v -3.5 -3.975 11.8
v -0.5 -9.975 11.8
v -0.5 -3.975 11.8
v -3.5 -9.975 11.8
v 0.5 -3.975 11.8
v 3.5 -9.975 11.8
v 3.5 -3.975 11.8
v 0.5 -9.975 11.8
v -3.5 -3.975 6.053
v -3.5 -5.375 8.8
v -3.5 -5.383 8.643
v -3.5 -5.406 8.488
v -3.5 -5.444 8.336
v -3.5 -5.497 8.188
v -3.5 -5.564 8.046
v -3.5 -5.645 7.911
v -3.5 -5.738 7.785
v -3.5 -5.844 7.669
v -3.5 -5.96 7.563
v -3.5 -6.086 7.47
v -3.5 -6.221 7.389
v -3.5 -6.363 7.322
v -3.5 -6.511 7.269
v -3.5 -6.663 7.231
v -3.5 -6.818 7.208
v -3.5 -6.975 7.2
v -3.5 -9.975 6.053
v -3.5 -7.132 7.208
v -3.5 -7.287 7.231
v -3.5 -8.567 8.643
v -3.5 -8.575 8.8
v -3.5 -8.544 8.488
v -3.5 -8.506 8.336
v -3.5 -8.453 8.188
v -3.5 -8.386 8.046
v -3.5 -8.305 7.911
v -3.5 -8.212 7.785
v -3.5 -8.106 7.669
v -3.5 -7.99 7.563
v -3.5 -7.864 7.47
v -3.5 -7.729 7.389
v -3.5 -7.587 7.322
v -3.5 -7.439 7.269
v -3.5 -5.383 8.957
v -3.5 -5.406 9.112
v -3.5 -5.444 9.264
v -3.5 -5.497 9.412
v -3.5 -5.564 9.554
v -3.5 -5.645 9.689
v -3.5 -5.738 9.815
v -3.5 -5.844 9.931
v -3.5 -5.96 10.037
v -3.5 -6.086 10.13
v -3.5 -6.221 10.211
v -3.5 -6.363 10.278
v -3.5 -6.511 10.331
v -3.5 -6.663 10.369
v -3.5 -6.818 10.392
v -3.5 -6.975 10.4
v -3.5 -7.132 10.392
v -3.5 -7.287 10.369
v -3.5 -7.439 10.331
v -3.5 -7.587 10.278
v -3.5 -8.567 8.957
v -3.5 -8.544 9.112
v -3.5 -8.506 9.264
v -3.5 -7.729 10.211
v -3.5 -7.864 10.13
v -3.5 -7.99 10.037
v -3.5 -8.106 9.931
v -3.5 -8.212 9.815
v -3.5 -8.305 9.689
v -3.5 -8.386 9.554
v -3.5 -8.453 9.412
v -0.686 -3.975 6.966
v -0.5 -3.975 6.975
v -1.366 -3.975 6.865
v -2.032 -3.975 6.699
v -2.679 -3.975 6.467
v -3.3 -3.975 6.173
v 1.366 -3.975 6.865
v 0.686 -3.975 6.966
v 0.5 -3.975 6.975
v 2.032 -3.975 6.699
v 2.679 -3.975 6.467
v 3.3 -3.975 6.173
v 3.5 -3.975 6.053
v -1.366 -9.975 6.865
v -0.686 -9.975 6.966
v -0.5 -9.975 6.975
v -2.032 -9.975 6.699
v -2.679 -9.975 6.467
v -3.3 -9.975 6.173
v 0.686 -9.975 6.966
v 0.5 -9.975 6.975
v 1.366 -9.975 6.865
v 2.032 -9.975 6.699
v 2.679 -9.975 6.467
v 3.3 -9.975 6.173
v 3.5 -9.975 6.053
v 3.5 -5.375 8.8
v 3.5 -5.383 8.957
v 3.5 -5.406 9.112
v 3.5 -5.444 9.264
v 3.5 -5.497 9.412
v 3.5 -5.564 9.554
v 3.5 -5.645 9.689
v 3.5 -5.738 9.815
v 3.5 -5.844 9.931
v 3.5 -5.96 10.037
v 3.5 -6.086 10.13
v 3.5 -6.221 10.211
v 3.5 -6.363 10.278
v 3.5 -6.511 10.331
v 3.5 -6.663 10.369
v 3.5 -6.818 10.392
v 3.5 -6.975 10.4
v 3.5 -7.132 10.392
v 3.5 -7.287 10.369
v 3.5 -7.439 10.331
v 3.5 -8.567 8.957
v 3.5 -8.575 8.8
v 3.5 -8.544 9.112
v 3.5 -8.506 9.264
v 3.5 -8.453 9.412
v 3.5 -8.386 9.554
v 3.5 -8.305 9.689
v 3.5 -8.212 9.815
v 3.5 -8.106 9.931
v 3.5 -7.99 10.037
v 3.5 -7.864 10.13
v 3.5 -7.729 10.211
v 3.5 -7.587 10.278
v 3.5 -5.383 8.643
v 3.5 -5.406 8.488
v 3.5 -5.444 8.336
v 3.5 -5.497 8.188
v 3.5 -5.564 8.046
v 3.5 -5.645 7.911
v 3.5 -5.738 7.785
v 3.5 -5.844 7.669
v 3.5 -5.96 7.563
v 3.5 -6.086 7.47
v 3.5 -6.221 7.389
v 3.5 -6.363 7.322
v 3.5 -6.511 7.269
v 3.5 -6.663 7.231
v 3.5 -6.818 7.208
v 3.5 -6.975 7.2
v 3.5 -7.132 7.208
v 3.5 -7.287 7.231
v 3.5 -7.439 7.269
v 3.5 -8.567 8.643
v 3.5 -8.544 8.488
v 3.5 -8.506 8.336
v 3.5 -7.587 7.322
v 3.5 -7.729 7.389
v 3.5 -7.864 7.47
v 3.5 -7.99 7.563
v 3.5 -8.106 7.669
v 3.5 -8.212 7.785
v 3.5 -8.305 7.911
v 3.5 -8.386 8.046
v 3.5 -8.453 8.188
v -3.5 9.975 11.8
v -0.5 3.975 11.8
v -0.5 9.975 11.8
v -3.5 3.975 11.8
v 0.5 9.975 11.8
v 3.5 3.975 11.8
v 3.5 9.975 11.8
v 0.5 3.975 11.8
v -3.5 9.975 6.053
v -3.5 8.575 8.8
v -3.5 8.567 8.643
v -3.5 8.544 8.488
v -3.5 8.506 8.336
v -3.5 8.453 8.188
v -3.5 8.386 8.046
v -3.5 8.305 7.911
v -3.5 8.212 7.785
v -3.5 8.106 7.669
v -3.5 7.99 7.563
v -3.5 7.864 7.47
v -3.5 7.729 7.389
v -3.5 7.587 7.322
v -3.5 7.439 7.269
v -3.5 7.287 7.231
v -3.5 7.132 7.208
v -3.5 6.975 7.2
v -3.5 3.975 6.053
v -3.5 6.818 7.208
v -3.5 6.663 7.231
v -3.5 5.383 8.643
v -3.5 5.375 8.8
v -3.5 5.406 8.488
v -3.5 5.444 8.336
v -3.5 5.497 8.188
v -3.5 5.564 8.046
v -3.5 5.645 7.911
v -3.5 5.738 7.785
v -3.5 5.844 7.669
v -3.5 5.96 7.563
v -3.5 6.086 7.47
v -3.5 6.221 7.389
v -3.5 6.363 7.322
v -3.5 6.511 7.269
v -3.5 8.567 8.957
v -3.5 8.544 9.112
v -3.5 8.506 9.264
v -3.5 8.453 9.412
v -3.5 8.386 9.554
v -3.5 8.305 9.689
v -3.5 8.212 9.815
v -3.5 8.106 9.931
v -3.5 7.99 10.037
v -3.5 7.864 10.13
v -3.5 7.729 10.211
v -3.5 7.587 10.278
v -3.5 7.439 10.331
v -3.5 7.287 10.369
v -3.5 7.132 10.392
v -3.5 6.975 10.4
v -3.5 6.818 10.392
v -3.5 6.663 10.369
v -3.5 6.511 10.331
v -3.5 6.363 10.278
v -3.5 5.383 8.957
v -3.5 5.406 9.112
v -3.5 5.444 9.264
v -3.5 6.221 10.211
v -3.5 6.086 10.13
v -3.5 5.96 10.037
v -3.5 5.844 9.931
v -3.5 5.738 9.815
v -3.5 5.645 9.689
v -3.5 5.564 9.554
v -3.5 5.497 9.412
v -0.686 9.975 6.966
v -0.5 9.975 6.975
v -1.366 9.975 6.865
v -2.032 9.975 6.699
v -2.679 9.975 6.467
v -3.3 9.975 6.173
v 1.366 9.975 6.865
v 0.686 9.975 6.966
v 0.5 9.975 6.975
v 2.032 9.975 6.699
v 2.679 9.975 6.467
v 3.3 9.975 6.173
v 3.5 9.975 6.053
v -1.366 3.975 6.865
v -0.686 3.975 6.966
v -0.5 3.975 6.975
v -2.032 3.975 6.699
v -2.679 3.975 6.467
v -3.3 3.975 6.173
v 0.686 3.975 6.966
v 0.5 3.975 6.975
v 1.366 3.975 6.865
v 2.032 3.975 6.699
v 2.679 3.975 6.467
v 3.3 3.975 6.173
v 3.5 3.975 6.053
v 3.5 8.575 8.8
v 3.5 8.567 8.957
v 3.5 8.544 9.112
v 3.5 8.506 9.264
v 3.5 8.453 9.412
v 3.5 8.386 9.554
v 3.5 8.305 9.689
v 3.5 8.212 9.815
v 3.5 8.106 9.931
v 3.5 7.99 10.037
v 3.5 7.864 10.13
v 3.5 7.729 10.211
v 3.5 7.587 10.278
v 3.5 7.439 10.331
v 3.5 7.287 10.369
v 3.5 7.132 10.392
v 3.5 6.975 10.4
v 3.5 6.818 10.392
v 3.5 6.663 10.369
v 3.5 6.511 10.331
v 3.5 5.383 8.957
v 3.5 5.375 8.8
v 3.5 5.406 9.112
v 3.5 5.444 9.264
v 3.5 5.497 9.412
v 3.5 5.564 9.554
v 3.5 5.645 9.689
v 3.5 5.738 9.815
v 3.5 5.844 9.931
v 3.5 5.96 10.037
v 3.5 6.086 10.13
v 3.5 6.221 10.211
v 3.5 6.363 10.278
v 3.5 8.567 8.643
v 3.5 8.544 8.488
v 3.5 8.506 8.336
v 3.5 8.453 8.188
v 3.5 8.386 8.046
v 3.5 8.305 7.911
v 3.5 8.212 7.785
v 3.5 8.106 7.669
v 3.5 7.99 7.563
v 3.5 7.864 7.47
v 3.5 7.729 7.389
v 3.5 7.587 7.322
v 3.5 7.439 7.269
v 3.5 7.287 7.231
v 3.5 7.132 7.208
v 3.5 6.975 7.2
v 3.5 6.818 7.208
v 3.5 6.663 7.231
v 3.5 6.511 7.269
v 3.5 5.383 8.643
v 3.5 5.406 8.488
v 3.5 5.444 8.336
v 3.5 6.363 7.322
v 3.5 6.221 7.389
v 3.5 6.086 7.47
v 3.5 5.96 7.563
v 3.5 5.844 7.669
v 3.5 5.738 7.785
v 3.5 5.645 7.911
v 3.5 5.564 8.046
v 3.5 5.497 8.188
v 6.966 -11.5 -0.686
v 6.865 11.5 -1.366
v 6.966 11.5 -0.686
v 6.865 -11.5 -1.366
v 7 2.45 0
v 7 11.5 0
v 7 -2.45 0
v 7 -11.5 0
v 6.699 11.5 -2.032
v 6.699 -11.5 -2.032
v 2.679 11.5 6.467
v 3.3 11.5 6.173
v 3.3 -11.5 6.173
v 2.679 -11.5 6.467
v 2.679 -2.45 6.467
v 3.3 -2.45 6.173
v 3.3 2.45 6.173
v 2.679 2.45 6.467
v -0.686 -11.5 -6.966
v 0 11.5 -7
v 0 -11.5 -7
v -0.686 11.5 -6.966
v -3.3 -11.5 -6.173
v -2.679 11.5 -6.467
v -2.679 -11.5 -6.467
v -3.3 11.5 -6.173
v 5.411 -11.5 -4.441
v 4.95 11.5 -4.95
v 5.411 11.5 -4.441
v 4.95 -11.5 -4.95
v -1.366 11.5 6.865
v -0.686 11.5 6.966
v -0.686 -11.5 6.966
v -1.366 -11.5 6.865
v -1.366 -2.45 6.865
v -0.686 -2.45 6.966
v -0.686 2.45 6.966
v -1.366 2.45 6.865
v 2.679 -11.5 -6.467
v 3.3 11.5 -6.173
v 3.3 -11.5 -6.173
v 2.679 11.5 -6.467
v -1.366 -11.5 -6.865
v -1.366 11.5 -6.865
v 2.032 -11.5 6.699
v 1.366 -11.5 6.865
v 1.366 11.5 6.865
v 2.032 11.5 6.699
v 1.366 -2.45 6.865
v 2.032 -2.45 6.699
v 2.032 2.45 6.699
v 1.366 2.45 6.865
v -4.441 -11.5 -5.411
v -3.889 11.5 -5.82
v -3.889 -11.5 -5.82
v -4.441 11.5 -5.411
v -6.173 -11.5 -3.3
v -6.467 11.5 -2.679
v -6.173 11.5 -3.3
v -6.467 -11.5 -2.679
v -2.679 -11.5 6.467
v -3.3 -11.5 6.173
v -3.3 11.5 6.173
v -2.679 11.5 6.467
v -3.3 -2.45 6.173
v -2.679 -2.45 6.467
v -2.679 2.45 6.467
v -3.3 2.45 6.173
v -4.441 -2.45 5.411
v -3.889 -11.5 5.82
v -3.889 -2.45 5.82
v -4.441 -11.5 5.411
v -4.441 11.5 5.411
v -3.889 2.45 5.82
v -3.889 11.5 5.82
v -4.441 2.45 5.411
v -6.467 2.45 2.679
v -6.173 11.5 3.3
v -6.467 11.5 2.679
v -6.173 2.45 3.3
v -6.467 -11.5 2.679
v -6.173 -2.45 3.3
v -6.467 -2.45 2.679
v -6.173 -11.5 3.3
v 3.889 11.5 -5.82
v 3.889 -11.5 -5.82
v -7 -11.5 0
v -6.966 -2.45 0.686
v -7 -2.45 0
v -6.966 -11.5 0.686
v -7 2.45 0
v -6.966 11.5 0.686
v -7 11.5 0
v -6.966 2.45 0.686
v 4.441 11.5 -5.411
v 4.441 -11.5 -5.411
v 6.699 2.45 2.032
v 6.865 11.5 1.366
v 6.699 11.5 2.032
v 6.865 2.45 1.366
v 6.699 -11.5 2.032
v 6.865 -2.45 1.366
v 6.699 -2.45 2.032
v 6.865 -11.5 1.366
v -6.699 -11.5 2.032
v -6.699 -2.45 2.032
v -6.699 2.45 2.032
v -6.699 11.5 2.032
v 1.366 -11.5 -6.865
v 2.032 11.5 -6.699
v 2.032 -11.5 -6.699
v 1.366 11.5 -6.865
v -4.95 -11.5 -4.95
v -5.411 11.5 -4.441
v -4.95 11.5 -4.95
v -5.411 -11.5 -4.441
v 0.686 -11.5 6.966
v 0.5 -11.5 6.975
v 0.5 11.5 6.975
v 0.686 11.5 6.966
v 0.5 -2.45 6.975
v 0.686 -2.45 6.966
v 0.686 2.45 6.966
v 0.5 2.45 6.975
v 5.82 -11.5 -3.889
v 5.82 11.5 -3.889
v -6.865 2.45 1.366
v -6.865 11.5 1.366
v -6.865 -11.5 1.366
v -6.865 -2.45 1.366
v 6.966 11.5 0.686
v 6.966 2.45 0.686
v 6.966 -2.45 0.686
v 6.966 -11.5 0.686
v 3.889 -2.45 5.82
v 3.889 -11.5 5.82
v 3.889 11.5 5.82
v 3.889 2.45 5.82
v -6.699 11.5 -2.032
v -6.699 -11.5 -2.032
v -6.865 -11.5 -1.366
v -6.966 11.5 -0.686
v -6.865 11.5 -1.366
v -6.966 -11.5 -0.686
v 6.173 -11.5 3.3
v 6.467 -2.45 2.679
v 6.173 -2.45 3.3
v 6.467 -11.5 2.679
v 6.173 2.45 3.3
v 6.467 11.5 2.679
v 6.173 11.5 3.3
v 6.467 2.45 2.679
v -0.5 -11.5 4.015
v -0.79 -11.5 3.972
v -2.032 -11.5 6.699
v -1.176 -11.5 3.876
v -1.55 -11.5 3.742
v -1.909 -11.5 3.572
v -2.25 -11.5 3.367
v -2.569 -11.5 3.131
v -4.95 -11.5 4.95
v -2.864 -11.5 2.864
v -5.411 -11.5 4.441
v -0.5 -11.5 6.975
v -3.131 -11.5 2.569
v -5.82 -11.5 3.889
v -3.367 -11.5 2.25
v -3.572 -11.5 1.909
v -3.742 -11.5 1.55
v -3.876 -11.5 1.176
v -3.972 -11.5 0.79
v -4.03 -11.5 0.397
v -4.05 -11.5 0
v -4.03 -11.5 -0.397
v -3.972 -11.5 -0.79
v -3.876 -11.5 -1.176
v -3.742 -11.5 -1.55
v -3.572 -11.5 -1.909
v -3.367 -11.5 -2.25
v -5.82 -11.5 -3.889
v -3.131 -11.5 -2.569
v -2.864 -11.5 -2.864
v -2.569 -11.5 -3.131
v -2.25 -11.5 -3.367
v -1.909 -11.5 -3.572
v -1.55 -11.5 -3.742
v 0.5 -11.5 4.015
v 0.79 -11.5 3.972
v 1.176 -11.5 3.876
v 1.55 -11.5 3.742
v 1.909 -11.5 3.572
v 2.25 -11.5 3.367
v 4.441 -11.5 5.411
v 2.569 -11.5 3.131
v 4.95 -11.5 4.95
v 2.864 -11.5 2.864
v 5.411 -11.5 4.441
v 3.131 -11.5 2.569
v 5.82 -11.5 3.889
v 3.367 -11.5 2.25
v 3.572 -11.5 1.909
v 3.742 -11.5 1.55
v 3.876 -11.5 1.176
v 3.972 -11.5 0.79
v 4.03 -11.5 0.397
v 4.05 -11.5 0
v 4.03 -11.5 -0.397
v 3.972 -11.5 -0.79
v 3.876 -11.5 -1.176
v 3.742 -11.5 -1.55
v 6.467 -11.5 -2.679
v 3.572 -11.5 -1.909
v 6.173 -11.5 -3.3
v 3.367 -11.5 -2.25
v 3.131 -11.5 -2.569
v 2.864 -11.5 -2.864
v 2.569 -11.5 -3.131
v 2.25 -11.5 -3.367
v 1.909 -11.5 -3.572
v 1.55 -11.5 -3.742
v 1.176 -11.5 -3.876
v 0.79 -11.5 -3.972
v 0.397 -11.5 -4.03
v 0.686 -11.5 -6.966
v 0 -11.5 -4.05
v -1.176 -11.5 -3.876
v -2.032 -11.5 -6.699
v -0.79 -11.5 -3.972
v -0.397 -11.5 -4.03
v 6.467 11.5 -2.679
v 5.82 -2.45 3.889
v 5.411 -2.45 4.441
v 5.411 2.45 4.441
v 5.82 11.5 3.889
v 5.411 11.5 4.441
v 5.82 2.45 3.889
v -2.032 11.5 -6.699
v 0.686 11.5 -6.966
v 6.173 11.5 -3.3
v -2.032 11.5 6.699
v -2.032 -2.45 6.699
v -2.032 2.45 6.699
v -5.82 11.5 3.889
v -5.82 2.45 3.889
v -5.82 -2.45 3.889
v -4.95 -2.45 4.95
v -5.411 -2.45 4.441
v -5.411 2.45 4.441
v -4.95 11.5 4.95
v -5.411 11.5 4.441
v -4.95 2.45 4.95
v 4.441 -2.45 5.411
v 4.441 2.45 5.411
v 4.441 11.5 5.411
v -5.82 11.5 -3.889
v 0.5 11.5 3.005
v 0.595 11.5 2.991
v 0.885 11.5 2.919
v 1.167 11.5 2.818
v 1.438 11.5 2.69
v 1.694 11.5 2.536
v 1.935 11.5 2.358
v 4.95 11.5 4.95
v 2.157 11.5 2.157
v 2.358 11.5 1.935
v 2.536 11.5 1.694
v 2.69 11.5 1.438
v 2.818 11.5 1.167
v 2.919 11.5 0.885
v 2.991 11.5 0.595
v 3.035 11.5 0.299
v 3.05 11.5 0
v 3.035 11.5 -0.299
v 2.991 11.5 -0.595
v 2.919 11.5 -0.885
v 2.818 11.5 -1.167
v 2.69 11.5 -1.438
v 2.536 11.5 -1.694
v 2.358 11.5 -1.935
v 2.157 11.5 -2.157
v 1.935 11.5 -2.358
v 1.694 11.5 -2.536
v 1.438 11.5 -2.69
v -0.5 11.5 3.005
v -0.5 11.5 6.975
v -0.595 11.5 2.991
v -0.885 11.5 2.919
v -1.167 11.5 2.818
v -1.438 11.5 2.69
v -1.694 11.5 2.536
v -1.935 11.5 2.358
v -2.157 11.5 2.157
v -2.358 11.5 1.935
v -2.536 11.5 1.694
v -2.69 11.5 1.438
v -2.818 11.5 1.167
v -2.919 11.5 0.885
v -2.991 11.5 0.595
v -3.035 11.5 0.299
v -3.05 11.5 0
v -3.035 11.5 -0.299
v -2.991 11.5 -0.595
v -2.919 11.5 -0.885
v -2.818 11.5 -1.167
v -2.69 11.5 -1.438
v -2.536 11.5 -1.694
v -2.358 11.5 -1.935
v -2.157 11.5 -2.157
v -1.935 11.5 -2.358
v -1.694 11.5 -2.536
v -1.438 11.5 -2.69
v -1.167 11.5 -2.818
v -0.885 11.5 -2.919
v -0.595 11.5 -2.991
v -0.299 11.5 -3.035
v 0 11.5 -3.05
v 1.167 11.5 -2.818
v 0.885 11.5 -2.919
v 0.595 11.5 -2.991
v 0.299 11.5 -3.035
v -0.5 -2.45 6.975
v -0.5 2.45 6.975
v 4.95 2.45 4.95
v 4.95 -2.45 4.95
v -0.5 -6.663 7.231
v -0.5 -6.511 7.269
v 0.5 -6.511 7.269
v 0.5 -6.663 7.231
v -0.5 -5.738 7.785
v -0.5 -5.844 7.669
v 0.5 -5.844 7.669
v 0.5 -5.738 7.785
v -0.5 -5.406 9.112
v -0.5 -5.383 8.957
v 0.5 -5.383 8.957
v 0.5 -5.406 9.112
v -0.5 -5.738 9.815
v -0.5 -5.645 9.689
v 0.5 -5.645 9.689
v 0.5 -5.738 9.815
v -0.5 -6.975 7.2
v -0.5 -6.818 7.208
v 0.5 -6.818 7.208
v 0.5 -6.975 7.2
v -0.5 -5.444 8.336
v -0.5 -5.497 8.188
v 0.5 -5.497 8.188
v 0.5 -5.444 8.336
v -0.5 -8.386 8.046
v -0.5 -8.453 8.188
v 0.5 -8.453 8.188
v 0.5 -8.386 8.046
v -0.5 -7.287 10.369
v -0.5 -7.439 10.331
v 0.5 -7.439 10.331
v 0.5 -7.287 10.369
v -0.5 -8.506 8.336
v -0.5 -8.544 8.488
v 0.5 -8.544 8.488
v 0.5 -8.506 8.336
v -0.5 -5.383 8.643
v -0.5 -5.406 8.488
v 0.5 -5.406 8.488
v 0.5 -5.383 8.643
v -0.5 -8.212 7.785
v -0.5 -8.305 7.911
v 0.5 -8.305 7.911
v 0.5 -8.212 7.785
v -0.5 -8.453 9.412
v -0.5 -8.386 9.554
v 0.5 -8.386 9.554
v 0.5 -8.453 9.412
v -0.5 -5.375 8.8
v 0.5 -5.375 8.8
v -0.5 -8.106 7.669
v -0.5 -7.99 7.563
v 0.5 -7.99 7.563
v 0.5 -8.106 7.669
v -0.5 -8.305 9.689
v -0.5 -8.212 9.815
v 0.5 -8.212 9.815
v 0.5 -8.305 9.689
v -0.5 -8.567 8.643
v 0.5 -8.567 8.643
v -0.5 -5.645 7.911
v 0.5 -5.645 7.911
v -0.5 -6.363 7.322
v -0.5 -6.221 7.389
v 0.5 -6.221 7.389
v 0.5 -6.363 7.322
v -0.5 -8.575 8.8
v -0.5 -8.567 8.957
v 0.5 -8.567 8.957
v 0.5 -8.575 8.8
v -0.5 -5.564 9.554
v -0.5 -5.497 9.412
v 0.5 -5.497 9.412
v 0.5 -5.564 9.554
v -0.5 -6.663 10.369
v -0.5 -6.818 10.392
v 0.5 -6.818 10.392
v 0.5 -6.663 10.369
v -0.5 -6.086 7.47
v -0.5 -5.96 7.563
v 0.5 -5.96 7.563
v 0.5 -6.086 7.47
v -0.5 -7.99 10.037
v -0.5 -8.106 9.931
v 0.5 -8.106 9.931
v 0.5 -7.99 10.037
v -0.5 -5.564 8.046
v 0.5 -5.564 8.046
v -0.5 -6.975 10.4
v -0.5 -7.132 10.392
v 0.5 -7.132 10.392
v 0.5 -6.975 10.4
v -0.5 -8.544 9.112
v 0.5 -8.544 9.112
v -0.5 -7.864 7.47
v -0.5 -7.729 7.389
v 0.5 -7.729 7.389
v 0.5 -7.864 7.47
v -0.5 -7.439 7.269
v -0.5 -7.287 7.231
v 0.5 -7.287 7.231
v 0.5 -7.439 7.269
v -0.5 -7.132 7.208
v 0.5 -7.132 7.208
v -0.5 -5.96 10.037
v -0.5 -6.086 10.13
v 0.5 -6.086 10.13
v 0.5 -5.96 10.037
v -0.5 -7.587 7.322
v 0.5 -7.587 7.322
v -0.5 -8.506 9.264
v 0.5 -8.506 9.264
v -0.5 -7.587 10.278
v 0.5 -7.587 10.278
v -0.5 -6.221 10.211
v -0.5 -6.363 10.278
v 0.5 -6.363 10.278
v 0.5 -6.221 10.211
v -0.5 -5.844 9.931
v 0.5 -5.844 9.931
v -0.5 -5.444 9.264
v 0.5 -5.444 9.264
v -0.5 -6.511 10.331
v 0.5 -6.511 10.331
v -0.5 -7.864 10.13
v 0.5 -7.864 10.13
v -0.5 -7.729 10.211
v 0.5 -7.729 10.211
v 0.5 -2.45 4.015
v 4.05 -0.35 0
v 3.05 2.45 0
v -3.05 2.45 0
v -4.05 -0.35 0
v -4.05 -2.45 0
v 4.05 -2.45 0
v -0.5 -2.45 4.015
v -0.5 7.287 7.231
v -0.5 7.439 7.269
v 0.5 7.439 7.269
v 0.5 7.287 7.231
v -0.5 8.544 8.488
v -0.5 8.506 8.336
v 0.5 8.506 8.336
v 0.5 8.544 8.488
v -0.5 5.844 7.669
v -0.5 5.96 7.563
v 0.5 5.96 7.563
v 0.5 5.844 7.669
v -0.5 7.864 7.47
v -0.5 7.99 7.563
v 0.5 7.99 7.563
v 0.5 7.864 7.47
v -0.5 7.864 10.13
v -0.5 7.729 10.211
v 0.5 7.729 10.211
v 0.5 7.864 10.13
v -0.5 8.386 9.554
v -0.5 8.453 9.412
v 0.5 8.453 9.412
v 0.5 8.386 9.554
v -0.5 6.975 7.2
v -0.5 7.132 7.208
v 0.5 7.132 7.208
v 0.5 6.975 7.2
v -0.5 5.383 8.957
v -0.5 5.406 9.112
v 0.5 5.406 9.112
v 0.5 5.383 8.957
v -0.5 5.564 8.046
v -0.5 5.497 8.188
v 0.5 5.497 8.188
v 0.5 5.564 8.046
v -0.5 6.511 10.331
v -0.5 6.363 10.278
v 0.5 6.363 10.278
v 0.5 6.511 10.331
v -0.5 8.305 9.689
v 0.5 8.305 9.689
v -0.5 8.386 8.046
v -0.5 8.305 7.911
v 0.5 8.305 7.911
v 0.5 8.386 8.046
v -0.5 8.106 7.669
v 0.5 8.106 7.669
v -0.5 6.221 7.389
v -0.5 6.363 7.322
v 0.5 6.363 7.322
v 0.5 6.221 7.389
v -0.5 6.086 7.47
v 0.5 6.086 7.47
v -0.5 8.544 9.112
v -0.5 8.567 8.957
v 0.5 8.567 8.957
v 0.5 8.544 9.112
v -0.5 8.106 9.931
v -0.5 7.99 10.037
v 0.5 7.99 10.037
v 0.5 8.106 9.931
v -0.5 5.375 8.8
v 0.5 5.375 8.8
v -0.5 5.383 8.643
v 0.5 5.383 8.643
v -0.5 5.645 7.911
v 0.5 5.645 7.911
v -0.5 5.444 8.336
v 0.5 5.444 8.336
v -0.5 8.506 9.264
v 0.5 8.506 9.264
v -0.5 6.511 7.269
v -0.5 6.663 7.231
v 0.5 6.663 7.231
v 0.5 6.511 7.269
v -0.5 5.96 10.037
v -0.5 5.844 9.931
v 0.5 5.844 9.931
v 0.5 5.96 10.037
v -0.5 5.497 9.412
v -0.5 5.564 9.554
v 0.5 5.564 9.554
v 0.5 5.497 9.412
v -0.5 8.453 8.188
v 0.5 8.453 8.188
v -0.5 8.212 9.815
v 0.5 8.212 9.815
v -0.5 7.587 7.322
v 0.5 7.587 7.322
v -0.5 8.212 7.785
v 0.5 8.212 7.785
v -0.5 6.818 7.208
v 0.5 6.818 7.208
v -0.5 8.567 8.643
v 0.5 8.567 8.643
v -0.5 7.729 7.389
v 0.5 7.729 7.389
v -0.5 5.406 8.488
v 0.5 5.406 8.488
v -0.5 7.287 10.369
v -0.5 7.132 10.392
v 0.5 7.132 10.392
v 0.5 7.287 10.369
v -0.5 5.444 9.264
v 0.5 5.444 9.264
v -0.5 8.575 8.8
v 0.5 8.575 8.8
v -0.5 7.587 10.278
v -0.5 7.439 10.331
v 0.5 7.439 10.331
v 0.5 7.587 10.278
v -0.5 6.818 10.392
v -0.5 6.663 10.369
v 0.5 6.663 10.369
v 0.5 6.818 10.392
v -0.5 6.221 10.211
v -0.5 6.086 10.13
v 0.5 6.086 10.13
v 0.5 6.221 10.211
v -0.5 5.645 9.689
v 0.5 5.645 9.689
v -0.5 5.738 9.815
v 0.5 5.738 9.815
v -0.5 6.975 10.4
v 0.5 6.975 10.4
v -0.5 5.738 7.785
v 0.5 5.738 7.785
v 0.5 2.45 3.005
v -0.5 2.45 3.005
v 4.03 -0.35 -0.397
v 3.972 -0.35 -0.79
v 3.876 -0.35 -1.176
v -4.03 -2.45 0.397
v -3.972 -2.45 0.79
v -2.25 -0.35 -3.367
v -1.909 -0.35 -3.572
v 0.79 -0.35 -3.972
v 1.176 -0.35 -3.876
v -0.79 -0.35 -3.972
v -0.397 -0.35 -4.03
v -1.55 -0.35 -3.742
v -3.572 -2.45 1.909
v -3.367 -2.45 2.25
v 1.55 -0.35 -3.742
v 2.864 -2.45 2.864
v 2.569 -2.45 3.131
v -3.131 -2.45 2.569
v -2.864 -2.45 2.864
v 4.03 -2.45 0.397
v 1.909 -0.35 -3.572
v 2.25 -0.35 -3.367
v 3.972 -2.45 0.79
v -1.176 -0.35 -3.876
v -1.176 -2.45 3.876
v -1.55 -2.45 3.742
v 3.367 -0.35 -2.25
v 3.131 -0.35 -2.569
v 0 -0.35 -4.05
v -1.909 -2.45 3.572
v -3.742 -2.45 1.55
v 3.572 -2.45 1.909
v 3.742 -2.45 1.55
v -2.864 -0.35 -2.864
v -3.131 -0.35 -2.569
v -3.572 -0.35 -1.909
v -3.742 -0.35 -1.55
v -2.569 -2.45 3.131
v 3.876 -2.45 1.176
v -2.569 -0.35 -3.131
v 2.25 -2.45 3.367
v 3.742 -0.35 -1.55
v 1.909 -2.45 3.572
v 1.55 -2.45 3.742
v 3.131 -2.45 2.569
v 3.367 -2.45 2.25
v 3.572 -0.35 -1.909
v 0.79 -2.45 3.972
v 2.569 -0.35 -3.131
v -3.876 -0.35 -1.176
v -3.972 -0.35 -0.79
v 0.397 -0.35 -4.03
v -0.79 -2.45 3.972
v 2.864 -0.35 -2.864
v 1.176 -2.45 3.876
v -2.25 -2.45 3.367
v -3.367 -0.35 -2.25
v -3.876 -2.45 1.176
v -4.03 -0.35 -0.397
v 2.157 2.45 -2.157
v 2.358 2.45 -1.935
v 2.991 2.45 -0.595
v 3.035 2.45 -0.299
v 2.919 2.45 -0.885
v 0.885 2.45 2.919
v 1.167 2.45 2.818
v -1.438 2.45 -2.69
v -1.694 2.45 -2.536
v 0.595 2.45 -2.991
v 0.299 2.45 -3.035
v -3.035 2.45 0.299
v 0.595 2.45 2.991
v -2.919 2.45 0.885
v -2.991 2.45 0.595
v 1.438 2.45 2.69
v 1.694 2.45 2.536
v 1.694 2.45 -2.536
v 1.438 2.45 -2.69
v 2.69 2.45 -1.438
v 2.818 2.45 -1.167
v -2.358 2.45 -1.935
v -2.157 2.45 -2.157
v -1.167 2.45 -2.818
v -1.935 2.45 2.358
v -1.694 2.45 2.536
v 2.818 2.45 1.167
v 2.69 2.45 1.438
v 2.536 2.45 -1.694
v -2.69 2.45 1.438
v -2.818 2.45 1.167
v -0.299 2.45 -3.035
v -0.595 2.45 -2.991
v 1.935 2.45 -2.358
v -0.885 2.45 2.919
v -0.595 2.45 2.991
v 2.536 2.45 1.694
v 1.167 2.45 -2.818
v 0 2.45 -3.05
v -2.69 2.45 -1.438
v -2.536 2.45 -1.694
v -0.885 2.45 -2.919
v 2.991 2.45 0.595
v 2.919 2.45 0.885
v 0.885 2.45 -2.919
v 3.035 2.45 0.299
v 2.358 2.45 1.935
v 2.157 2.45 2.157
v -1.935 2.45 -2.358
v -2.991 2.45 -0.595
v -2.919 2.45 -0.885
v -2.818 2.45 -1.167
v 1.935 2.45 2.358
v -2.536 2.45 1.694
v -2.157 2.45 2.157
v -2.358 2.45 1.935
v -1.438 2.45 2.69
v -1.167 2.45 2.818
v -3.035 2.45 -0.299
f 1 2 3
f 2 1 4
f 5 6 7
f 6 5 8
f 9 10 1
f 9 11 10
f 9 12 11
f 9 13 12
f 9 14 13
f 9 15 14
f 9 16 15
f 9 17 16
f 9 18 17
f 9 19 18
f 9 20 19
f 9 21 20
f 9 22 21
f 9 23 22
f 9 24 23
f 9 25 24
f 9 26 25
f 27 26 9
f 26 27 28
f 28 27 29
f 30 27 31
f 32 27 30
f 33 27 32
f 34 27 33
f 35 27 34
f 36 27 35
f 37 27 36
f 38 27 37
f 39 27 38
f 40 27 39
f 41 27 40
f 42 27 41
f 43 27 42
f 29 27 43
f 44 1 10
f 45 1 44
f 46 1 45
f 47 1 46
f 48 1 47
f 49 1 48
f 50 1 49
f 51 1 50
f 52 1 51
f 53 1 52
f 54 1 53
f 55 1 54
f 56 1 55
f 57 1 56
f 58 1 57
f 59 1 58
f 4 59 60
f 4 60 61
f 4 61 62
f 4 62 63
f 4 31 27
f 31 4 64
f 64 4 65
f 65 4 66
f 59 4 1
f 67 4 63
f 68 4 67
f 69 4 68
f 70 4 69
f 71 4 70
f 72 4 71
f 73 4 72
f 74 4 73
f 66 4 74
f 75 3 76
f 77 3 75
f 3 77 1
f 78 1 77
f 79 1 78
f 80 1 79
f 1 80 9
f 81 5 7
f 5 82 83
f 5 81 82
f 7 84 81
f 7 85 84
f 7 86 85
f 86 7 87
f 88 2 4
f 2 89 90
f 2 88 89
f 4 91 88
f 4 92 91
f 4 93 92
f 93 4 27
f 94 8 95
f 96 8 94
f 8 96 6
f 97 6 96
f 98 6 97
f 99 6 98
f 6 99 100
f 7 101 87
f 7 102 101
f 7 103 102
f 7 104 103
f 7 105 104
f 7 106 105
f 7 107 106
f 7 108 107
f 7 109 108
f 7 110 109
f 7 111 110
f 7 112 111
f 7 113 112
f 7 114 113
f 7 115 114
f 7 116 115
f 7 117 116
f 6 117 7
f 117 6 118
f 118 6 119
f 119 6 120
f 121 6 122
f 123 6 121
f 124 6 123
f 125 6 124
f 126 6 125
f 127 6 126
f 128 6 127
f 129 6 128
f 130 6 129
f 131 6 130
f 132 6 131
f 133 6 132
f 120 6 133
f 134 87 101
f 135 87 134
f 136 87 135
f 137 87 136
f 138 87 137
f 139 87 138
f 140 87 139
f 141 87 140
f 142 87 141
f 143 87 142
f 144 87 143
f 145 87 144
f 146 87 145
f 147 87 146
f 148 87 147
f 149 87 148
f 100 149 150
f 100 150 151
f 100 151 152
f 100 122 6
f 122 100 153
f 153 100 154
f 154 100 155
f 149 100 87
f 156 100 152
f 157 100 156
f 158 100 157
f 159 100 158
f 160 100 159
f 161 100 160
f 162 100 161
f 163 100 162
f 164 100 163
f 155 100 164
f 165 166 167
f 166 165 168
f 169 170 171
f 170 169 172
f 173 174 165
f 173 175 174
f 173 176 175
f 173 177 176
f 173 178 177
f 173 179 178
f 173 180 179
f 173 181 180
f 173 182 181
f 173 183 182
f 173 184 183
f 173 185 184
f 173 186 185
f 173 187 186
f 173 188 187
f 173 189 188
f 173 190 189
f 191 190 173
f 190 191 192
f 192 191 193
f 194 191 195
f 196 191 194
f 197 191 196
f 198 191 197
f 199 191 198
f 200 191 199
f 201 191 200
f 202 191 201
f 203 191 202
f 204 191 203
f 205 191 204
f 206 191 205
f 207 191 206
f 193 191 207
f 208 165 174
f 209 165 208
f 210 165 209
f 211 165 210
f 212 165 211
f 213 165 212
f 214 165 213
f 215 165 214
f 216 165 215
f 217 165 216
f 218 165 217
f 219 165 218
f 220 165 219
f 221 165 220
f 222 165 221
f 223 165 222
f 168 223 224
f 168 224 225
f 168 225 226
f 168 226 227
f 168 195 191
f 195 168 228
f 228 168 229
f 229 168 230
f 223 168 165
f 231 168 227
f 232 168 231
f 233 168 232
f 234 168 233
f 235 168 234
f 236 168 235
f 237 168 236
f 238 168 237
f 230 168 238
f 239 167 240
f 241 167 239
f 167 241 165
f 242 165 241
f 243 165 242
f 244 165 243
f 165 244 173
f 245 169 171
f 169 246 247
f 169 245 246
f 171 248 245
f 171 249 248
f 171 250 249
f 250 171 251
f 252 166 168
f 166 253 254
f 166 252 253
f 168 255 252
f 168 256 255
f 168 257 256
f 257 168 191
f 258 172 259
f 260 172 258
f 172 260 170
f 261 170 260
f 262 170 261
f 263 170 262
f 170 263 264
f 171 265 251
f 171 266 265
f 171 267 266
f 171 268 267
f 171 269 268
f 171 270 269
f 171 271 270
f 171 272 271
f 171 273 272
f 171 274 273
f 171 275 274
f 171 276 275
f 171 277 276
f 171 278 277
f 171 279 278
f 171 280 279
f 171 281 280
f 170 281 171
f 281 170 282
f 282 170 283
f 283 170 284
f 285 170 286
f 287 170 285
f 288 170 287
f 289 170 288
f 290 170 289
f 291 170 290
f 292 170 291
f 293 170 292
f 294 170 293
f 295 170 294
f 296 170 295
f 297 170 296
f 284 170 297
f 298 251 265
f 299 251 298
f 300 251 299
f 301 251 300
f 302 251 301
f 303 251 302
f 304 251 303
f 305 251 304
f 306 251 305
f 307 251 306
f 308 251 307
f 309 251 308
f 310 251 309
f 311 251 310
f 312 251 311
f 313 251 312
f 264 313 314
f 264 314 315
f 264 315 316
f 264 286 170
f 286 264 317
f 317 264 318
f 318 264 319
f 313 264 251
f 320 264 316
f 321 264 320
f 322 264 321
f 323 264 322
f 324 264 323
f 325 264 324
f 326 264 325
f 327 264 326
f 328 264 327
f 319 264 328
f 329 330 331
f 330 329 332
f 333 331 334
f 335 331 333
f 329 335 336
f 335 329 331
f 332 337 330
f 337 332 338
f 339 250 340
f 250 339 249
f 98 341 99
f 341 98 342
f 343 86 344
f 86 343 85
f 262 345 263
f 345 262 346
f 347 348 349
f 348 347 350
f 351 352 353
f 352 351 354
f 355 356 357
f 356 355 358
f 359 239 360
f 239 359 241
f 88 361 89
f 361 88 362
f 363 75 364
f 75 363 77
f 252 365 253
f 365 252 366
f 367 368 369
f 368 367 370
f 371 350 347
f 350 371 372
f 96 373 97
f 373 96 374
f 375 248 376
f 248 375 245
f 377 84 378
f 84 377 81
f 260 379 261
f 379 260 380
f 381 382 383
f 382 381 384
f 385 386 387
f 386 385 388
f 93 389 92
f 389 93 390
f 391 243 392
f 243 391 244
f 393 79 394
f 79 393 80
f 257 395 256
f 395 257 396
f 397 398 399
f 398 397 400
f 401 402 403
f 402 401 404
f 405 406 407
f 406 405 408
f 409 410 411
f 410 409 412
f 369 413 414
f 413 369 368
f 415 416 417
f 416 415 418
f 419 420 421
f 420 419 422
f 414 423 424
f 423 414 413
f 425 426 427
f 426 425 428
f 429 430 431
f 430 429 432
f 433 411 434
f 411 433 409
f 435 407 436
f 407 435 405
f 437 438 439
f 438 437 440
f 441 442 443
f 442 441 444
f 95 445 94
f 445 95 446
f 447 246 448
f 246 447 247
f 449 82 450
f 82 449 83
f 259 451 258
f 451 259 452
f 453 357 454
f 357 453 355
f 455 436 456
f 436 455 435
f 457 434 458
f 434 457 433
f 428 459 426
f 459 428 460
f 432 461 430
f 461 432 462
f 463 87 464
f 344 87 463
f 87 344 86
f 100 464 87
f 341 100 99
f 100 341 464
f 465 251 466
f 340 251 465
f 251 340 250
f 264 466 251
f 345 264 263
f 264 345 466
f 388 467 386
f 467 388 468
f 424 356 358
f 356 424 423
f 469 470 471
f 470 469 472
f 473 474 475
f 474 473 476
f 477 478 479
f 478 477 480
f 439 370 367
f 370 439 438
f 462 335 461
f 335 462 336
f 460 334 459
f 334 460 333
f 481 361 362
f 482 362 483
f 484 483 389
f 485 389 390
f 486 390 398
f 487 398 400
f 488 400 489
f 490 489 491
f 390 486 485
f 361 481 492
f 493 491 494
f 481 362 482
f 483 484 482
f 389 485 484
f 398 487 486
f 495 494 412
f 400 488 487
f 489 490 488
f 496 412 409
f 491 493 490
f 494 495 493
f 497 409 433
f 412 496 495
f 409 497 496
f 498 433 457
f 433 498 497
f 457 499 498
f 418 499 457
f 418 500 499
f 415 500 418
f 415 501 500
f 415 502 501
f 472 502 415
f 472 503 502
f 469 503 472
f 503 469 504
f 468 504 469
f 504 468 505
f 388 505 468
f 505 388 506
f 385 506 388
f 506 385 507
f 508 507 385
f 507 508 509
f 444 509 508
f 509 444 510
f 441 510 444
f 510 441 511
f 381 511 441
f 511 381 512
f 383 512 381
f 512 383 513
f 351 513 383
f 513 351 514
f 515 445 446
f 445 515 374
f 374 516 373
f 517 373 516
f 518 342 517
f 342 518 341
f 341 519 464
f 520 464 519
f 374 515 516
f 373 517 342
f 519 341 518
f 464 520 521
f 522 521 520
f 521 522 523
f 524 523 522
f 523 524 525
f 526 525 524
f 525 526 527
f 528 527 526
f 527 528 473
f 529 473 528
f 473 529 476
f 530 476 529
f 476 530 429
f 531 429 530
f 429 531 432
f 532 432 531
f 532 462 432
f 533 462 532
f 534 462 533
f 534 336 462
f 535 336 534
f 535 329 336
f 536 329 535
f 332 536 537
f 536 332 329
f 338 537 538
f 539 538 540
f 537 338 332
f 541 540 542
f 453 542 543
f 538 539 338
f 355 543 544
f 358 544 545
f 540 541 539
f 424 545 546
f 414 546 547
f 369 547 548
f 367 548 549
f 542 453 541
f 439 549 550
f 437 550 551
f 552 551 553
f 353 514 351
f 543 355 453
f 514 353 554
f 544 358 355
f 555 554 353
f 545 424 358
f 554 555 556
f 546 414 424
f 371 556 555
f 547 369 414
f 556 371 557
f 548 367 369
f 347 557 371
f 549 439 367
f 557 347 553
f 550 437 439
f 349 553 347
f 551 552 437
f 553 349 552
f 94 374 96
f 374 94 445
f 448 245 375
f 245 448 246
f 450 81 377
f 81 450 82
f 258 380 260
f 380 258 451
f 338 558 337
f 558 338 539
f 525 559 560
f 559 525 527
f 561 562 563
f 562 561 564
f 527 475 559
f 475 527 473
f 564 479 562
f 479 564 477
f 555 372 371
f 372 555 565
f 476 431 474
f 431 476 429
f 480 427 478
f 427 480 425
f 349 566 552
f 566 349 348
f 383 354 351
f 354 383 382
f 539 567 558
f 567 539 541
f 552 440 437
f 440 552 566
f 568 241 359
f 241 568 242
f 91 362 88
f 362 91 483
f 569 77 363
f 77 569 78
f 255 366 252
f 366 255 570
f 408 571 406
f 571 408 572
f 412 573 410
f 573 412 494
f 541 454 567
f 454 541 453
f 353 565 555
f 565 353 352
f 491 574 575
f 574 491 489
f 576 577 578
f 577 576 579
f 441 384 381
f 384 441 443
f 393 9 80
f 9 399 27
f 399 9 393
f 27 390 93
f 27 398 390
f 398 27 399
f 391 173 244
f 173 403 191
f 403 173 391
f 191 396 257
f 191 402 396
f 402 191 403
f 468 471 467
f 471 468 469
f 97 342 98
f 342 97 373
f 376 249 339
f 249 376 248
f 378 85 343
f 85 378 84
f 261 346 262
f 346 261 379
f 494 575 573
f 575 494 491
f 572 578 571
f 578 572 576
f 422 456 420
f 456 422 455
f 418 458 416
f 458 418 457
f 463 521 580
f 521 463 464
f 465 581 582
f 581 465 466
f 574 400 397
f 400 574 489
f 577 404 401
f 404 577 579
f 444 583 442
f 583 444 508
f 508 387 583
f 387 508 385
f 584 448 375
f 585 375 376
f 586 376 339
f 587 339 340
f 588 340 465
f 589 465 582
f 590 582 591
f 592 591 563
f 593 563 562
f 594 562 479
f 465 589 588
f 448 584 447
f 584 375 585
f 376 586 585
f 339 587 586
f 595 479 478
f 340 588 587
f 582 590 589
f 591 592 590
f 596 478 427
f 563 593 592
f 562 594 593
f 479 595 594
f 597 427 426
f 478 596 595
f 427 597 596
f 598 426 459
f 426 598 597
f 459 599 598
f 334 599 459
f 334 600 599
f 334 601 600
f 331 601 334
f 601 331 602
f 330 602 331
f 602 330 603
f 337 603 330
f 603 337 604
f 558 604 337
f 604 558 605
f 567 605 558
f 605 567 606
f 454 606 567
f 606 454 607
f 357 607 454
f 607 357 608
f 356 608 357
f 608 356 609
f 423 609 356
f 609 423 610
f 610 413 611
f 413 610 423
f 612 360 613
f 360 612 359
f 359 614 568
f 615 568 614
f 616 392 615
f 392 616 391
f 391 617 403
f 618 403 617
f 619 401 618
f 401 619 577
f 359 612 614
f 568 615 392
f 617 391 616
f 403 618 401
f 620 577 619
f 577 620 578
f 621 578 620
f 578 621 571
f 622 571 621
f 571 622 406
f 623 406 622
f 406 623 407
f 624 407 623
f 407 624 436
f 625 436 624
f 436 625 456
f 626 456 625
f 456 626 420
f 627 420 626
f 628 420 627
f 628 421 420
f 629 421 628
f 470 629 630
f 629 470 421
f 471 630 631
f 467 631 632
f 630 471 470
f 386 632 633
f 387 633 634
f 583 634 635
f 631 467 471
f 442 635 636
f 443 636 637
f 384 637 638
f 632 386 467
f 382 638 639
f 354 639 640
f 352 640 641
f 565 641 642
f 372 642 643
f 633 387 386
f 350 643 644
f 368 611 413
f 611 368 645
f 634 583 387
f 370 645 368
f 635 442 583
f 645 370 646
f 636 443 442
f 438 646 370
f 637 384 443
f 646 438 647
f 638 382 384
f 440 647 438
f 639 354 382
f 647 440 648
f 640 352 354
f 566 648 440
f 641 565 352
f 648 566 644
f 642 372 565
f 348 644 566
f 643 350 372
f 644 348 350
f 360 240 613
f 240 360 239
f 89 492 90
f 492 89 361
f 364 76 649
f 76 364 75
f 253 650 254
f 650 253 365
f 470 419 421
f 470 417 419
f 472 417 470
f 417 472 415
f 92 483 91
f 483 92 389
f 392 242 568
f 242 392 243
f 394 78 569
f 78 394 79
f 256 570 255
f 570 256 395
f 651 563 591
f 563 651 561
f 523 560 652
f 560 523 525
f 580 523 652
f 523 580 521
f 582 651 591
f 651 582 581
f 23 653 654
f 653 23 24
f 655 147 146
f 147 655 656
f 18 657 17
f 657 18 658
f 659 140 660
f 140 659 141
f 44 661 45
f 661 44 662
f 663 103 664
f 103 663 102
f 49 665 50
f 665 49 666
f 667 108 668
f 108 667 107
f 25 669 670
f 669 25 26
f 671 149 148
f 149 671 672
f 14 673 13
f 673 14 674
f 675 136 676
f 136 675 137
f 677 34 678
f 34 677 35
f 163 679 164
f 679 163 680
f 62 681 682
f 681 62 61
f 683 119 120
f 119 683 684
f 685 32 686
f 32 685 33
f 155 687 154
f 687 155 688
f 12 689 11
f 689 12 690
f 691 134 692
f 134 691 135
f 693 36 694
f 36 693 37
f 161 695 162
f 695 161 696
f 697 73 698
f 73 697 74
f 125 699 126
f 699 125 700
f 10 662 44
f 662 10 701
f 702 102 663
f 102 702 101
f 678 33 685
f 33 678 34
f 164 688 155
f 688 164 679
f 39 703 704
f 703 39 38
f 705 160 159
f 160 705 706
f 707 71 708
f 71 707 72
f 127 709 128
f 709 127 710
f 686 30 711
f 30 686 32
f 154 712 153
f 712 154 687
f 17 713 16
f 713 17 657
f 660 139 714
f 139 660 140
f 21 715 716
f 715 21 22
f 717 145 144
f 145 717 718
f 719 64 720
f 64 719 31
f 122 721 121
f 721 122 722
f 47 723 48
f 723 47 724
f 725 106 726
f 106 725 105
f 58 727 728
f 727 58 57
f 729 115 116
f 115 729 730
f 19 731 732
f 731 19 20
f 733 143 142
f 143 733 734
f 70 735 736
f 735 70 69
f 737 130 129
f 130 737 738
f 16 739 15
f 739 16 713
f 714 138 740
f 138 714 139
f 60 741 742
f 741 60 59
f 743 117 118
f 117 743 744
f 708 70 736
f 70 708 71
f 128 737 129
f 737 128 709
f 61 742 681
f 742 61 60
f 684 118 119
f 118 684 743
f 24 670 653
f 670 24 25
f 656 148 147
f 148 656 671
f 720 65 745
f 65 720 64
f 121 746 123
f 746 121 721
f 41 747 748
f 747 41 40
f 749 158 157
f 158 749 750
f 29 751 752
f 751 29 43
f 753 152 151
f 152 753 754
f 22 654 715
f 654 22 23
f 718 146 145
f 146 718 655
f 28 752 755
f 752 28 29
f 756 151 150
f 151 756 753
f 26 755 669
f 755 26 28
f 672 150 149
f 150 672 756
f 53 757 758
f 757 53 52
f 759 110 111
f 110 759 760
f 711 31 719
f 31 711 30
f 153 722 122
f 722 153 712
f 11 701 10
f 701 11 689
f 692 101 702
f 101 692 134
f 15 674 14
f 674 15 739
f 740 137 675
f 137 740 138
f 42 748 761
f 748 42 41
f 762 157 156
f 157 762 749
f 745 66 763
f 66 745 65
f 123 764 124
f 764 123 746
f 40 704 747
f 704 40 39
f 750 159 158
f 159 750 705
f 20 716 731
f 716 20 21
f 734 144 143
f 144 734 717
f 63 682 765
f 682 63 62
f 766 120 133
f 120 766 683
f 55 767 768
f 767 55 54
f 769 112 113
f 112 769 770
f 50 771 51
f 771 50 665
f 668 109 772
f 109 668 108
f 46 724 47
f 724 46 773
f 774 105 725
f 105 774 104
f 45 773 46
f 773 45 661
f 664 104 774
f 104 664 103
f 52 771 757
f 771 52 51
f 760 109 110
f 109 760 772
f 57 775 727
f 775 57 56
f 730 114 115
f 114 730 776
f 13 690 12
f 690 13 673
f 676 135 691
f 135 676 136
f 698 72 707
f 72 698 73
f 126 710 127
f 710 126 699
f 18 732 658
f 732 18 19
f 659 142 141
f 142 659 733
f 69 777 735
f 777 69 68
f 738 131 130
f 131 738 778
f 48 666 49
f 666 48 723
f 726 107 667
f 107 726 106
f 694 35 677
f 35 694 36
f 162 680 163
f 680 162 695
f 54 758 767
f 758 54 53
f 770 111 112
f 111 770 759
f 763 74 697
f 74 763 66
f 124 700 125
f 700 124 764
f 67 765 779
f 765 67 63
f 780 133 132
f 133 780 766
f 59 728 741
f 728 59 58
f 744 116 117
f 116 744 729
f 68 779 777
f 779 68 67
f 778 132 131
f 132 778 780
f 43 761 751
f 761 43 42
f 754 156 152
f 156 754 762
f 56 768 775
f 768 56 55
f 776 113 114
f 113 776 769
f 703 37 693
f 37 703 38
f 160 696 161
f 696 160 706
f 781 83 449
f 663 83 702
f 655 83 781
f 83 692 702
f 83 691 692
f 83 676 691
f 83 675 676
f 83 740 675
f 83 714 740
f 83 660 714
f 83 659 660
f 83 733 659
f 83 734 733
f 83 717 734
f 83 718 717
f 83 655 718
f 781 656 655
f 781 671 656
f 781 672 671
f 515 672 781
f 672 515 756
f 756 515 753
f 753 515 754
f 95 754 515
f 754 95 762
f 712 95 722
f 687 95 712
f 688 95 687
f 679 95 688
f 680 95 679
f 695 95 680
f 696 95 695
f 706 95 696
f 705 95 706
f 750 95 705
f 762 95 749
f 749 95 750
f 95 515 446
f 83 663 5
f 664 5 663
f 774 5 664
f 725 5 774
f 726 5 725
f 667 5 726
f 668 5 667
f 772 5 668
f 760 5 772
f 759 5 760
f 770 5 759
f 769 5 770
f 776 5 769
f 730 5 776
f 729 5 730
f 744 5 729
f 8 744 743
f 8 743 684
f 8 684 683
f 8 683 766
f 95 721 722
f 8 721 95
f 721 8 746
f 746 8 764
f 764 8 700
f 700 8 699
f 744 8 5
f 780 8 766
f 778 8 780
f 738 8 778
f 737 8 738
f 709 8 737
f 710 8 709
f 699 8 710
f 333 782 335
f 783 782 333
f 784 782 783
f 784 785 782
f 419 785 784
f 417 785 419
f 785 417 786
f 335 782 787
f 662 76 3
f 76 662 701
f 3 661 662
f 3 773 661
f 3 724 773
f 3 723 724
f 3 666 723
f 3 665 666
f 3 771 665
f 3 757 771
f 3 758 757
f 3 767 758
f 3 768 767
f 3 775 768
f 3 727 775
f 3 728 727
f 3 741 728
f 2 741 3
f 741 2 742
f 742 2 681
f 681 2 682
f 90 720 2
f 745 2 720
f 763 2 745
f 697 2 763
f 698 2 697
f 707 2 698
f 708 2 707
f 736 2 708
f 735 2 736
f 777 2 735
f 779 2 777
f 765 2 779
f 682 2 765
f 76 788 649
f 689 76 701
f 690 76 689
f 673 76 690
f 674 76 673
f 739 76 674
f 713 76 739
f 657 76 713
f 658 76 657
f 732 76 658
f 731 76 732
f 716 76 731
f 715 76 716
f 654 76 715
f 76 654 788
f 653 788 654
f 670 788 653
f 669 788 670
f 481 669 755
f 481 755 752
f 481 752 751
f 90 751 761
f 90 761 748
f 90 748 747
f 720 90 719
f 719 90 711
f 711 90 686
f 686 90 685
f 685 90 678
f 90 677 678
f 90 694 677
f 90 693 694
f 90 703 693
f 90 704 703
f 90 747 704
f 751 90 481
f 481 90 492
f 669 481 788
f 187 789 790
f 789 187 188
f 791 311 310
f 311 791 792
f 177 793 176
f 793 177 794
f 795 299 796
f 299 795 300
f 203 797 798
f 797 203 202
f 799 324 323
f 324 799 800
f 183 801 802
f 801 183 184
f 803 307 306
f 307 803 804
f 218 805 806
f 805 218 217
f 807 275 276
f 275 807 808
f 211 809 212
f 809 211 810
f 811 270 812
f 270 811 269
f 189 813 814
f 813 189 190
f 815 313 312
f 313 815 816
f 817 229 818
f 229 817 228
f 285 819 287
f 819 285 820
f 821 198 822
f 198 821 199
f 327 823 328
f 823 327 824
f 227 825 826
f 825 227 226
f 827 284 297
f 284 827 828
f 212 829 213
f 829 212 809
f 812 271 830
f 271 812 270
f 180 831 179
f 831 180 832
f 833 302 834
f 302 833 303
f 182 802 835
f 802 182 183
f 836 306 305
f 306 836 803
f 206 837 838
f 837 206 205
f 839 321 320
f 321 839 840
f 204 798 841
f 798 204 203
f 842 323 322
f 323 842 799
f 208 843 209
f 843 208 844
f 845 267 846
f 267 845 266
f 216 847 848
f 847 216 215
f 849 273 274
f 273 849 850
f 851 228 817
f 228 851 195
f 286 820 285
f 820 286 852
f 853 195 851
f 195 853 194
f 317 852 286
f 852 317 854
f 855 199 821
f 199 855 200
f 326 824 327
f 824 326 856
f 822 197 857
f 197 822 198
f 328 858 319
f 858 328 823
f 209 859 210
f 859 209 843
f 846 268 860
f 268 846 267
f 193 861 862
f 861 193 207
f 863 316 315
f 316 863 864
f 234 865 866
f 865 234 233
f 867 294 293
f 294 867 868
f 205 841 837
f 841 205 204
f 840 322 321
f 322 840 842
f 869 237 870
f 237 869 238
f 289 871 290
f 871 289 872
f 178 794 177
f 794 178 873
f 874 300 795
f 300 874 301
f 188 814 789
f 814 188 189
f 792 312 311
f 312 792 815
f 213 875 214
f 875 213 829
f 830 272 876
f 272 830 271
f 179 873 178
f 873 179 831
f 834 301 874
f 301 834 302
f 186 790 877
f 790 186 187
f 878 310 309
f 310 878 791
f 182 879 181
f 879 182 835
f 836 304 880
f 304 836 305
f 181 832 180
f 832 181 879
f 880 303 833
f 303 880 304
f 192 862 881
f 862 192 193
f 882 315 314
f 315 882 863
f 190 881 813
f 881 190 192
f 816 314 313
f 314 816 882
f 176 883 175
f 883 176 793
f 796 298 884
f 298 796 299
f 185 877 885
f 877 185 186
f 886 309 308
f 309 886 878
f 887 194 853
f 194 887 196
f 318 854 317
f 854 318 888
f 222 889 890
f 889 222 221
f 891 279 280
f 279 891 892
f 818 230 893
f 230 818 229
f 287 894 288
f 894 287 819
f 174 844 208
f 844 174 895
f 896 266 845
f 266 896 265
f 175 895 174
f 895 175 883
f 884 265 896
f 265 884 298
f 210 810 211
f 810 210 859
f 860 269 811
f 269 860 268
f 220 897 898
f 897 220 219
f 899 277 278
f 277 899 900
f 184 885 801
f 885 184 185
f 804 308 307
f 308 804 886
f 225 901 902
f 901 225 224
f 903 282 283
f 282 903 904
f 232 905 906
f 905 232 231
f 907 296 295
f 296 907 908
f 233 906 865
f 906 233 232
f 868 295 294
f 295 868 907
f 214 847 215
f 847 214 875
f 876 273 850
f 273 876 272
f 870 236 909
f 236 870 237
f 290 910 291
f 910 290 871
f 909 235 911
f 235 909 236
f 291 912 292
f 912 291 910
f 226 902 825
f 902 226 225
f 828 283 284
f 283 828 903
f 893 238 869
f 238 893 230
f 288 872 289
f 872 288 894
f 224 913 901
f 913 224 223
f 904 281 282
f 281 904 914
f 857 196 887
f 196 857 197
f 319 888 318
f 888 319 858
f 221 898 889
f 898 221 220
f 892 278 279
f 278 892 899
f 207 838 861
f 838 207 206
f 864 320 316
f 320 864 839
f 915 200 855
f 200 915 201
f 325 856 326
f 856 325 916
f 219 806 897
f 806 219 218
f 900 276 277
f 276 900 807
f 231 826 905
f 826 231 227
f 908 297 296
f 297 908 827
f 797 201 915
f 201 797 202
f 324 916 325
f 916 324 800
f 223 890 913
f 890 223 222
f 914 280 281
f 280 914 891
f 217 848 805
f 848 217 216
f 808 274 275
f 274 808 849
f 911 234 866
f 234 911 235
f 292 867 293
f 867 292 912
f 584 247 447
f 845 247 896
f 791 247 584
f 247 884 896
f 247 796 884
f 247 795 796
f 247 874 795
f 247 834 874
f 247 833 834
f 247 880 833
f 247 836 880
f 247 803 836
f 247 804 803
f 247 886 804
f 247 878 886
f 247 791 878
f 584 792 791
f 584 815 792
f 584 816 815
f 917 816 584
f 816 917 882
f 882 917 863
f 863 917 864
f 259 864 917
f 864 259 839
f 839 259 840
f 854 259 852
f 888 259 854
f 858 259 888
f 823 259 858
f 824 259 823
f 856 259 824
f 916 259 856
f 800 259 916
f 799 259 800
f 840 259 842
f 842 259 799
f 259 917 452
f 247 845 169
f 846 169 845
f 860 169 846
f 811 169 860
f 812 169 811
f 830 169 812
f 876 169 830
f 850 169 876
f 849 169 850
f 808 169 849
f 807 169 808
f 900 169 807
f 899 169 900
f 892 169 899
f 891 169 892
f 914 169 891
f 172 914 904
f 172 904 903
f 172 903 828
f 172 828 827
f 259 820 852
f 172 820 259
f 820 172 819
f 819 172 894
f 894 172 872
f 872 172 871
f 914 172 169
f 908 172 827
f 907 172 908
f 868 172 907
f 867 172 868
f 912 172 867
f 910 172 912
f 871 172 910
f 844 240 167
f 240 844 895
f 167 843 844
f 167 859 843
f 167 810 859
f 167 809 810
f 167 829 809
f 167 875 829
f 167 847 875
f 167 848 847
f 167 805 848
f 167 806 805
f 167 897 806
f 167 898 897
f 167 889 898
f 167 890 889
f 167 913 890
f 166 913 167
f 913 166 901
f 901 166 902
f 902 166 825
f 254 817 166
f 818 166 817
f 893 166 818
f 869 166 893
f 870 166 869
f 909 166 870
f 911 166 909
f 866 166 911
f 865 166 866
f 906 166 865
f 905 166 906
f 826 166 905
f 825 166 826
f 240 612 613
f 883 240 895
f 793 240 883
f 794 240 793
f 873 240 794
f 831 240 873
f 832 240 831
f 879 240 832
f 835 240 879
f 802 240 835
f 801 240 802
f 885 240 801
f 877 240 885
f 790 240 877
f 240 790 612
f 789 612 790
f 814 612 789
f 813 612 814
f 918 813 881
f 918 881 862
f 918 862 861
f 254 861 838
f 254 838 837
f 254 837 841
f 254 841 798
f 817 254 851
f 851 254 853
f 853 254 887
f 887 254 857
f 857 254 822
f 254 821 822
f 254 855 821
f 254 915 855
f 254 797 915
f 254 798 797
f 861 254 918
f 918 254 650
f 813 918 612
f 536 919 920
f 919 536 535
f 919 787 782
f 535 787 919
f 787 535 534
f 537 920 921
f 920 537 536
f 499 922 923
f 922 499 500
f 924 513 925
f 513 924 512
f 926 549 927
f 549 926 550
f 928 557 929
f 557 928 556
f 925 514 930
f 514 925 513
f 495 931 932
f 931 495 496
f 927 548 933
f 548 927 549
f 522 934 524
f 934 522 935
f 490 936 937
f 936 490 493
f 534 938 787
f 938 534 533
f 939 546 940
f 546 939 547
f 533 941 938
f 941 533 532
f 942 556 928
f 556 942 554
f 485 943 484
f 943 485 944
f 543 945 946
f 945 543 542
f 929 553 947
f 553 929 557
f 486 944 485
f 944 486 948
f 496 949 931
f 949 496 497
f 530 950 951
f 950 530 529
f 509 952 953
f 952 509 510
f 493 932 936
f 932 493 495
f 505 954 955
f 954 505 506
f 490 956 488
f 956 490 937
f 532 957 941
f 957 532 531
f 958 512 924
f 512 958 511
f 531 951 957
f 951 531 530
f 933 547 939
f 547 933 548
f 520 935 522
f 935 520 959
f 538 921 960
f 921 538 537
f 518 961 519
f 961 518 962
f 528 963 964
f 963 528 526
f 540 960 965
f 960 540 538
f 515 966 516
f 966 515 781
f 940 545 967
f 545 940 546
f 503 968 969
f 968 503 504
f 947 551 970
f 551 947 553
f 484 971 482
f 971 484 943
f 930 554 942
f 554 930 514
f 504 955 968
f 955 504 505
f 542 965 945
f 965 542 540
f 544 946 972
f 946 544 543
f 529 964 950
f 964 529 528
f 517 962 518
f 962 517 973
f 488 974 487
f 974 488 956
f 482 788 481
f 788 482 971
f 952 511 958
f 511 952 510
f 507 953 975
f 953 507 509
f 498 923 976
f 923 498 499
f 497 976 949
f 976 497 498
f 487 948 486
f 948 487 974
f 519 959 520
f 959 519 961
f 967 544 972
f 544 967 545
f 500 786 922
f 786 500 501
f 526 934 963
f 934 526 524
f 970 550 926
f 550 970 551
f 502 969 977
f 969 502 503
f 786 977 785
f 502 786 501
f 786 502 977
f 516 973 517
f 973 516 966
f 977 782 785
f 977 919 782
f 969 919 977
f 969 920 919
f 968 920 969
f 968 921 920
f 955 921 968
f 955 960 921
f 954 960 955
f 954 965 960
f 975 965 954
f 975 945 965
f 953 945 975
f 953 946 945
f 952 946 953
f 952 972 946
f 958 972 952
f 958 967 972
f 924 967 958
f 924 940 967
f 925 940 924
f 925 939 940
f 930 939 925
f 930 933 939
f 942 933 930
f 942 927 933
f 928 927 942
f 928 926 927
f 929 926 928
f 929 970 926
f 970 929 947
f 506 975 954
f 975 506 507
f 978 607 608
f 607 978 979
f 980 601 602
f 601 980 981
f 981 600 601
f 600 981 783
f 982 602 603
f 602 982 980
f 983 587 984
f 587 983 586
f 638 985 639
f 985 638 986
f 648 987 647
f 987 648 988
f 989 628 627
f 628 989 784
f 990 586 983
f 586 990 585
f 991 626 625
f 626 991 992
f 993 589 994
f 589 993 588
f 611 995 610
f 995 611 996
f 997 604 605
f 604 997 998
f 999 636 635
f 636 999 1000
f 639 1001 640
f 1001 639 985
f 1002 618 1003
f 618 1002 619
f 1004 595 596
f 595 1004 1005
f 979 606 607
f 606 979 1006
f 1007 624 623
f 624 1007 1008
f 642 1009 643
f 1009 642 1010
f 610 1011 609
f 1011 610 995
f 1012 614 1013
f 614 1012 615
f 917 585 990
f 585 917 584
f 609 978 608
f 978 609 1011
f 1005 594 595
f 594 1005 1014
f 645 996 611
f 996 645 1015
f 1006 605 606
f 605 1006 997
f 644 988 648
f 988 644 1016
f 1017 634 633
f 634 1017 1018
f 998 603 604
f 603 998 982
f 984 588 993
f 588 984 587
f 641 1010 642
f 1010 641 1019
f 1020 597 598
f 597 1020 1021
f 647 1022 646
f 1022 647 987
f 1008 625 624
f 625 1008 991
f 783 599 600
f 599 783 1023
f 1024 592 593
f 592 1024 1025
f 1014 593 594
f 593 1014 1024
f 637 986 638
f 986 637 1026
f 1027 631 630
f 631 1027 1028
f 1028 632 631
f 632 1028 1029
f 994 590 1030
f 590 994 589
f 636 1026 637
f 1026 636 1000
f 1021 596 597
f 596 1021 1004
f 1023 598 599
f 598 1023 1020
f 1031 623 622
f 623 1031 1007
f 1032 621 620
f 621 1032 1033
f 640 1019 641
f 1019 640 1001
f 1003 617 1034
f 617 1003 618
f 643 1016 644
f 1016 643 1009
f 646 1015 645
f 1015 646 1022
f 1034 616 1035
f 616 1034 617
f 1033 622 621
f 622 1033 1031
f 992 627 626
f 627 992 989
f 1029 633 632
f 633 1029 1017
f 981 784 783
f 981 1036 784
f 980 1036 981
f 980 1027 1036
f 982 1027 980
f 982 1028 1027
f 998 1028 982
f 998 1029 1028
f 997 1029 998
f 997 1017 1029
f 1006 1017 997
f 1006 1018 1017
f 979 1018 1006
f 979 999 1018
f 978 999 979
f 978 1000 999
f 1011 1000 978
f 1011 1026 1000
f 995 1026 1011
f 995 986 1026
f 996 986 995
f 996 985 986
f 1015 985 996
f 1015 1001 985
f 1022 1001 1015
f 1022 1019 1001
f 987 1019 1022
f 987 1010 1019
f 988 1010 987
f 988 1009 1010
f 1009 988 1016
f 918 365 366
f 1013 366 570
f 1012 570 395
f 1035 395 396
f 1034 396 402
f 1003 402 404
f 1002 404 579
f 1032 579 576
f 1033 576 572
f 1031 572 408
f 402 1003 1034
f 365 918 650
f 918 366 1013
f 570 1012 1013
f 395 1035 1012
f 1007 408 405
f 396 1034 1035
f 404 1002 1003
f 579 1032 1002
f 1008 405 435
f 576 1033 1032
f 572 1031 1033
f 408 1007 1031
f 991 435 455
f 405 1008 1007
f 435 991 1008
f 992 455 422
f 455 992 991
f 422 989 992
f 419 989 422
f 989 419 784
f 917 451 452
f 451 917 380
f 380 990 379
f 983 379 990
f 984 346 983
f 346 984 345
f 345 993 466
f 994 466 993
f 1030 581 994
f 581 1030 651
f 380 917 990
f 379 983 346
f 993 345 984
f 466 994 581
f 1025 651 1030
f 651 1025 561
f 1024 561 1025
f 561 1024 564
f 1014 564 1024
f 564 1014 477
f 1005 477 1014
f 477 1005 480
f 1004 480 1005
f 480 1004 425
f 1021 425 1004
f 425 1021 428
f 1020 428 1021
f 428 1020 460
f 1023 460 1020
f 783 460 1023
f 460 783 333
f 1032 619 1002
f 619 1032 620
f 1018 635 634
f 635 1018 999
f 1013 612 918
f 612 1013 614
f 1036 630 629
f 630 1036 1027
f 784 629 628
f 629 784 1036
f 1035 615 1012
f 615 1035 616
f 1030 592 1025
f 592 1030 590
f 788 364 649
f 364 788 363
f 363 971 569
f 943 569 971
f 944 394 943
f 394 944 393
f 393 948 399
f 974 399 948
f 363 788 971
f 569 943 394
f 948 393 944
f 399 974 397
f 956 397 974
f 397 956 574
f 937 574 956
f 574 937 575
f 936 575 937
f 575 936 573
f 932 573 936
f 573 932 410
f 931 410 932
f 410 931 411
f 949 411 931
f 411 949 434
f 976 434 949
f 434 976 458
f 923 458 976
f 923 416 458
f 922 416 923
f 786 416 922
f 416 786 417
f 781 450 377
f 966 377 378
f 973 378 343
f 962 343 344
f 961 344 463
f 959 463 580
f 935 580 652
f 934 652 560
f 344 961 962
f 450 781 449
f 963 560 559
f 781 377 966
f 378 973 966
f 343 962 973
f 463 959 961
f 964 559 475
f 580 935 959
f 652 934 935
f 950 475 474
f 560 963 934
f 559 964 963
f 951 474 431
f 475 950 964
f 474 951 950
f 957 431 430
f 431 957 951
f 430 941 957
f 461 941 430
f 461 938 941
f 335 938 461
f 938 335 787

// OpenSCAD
// Standalone solid shaft coupler (structural shaft <-> AN25 encoder).
// v4 2026-07-13 REPRINT: length 23, encoder bore 9 (was 26 / 12) so the
// coupler end clears the as-printed bracket plate by 0.6 mm.
// Reprint together with the rear upper socket.

part_mode = "solid_coupler";
part_cutaway = false;      // true to inspect the bores and clamp slits
print_export = true;       // use high quality $fn for STL export

include <../frame_master.scad>
